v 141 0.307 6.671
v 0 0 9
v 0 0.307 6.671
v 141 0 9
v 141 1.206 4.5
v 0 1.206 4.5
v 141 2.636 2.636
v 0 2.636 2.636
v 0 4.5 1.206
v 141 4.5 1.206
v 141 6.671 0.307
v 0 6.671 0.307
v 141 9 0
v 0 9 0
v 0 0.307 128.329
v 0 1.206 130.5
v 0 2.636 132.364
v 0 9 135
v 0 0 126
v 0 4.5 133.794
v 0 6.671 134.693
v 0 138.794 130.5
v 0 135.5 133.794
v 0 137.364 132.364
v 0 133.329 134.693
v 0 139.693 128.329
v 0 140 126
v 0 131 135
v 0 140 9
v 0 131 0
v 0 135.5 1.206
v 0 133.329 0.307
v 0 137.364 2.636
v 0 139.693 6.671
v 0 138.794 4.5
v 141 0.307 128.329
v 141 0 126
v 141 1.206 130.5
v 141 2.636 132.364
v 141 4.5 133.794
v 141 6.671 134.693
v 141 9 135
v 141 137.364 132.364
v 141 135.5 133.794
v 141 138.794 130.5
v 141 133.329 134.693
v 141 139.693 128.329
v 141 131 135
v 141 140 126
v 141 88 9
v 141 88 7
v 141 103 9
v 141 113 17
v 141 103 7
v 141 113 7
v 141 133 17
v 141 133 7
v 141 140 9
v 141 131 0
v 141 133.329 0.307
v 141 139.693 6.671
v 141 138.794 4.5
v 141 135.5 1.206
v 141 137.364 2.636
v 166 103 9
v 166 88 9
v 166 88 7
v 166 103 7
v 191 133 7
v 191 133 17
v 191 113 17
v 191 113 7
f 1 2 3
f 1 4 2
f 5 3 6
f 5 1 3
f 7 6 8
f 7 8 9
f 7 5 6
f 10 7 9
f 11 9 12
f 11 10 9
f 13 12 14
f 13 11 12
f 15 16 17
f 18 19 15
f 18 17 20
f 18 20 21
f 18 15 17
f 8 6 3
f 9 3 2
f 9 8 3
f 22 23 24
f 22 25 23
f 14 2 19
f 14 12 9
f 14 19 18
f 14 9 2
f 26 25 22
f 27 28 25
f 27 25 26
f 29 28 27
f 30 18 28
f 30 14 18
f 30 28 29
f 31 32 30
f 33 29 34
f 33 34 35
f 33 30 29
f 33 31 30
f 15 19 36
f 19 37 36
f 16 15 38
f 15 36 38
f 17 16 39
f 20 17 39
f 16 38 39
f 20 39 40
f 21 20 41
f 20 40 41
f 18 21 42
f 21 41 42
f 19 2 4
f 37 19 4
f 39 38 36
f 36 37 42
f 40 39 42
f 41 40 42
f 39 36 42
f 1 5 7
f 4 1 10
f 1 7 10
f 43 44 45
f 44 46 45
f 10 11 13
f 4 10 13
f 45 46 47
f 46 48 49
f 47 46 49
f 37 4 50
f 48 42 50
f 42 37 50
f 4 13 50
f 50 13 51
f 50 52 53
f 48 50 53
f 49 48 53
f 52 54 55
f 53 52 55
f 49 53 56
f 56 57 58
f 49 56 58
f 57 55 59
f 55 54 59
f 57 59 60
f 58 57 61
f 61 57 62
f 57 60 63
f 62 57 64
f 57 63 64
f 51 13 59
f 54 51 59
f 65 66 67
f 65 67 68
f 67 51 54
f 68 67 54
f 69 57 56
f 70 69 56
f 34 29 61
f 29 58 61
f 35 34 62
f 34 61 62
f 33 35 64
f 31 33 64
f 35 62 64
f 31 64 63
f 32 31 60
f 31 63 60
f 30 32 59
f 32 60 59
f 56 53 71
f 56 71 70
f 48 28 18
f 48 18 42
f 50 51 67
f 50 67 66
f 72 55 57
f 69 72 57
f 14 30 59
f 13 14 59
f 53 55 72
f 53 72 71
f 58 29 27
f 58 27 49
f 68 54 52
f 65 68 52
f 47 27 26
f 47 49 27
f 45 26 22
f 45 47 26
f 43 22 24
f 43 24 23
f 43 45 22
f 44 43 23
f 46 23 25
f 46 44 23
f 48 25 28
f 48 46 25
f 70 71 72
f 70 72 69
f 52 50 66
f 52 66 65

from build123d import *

# Parameters (mm, degrees)
F0_W     = 141
F0_H     = 140
F1_DEPTH = 135
F3_R     = 9
F2_W     = 20
F2_H     = 10
F4_DEPTH = 50
F2_W_2   = 15
F2_H_2   = 2
F5_DEPTH = 25


with BuildPart() as f1:
    # F0 (on Top) → F1 (new body)
    with BuildSketch(Plane.XY):
        with Locations((70.5, 70)):
            Rectangle(F0_W, F0_H)
    extrude(amount=F1_DEPTH)

    # F3
    f3_edges = [f1.edges().sort_by_distance(p)[0] for p in [
        (70.5, 140, 0),
        (70.5, 140, 135),
        (70.5, 0, 0),
        (70.5, 0, 135),
    ]]
    fillet(f3_edges, radius=F3_R)

    # F2 (on face) → F4 (join)
    with BuildSketch(Plane.YZ.offset(141)):
        with Locations((123, 12)):
            Rectangle(F2_W, F2_H)
    extrude(amount=F4_DEPTH)

    # F2 (on face) → F5 (join)
    with BuildSketch(Plane.YZ.offset(141)):
        with Locations((95.5, 8)):
            Rectangle(F2_W_2, F2_H_2)
    extrude(amount=F5_DEPTH)


solid = f1.part
